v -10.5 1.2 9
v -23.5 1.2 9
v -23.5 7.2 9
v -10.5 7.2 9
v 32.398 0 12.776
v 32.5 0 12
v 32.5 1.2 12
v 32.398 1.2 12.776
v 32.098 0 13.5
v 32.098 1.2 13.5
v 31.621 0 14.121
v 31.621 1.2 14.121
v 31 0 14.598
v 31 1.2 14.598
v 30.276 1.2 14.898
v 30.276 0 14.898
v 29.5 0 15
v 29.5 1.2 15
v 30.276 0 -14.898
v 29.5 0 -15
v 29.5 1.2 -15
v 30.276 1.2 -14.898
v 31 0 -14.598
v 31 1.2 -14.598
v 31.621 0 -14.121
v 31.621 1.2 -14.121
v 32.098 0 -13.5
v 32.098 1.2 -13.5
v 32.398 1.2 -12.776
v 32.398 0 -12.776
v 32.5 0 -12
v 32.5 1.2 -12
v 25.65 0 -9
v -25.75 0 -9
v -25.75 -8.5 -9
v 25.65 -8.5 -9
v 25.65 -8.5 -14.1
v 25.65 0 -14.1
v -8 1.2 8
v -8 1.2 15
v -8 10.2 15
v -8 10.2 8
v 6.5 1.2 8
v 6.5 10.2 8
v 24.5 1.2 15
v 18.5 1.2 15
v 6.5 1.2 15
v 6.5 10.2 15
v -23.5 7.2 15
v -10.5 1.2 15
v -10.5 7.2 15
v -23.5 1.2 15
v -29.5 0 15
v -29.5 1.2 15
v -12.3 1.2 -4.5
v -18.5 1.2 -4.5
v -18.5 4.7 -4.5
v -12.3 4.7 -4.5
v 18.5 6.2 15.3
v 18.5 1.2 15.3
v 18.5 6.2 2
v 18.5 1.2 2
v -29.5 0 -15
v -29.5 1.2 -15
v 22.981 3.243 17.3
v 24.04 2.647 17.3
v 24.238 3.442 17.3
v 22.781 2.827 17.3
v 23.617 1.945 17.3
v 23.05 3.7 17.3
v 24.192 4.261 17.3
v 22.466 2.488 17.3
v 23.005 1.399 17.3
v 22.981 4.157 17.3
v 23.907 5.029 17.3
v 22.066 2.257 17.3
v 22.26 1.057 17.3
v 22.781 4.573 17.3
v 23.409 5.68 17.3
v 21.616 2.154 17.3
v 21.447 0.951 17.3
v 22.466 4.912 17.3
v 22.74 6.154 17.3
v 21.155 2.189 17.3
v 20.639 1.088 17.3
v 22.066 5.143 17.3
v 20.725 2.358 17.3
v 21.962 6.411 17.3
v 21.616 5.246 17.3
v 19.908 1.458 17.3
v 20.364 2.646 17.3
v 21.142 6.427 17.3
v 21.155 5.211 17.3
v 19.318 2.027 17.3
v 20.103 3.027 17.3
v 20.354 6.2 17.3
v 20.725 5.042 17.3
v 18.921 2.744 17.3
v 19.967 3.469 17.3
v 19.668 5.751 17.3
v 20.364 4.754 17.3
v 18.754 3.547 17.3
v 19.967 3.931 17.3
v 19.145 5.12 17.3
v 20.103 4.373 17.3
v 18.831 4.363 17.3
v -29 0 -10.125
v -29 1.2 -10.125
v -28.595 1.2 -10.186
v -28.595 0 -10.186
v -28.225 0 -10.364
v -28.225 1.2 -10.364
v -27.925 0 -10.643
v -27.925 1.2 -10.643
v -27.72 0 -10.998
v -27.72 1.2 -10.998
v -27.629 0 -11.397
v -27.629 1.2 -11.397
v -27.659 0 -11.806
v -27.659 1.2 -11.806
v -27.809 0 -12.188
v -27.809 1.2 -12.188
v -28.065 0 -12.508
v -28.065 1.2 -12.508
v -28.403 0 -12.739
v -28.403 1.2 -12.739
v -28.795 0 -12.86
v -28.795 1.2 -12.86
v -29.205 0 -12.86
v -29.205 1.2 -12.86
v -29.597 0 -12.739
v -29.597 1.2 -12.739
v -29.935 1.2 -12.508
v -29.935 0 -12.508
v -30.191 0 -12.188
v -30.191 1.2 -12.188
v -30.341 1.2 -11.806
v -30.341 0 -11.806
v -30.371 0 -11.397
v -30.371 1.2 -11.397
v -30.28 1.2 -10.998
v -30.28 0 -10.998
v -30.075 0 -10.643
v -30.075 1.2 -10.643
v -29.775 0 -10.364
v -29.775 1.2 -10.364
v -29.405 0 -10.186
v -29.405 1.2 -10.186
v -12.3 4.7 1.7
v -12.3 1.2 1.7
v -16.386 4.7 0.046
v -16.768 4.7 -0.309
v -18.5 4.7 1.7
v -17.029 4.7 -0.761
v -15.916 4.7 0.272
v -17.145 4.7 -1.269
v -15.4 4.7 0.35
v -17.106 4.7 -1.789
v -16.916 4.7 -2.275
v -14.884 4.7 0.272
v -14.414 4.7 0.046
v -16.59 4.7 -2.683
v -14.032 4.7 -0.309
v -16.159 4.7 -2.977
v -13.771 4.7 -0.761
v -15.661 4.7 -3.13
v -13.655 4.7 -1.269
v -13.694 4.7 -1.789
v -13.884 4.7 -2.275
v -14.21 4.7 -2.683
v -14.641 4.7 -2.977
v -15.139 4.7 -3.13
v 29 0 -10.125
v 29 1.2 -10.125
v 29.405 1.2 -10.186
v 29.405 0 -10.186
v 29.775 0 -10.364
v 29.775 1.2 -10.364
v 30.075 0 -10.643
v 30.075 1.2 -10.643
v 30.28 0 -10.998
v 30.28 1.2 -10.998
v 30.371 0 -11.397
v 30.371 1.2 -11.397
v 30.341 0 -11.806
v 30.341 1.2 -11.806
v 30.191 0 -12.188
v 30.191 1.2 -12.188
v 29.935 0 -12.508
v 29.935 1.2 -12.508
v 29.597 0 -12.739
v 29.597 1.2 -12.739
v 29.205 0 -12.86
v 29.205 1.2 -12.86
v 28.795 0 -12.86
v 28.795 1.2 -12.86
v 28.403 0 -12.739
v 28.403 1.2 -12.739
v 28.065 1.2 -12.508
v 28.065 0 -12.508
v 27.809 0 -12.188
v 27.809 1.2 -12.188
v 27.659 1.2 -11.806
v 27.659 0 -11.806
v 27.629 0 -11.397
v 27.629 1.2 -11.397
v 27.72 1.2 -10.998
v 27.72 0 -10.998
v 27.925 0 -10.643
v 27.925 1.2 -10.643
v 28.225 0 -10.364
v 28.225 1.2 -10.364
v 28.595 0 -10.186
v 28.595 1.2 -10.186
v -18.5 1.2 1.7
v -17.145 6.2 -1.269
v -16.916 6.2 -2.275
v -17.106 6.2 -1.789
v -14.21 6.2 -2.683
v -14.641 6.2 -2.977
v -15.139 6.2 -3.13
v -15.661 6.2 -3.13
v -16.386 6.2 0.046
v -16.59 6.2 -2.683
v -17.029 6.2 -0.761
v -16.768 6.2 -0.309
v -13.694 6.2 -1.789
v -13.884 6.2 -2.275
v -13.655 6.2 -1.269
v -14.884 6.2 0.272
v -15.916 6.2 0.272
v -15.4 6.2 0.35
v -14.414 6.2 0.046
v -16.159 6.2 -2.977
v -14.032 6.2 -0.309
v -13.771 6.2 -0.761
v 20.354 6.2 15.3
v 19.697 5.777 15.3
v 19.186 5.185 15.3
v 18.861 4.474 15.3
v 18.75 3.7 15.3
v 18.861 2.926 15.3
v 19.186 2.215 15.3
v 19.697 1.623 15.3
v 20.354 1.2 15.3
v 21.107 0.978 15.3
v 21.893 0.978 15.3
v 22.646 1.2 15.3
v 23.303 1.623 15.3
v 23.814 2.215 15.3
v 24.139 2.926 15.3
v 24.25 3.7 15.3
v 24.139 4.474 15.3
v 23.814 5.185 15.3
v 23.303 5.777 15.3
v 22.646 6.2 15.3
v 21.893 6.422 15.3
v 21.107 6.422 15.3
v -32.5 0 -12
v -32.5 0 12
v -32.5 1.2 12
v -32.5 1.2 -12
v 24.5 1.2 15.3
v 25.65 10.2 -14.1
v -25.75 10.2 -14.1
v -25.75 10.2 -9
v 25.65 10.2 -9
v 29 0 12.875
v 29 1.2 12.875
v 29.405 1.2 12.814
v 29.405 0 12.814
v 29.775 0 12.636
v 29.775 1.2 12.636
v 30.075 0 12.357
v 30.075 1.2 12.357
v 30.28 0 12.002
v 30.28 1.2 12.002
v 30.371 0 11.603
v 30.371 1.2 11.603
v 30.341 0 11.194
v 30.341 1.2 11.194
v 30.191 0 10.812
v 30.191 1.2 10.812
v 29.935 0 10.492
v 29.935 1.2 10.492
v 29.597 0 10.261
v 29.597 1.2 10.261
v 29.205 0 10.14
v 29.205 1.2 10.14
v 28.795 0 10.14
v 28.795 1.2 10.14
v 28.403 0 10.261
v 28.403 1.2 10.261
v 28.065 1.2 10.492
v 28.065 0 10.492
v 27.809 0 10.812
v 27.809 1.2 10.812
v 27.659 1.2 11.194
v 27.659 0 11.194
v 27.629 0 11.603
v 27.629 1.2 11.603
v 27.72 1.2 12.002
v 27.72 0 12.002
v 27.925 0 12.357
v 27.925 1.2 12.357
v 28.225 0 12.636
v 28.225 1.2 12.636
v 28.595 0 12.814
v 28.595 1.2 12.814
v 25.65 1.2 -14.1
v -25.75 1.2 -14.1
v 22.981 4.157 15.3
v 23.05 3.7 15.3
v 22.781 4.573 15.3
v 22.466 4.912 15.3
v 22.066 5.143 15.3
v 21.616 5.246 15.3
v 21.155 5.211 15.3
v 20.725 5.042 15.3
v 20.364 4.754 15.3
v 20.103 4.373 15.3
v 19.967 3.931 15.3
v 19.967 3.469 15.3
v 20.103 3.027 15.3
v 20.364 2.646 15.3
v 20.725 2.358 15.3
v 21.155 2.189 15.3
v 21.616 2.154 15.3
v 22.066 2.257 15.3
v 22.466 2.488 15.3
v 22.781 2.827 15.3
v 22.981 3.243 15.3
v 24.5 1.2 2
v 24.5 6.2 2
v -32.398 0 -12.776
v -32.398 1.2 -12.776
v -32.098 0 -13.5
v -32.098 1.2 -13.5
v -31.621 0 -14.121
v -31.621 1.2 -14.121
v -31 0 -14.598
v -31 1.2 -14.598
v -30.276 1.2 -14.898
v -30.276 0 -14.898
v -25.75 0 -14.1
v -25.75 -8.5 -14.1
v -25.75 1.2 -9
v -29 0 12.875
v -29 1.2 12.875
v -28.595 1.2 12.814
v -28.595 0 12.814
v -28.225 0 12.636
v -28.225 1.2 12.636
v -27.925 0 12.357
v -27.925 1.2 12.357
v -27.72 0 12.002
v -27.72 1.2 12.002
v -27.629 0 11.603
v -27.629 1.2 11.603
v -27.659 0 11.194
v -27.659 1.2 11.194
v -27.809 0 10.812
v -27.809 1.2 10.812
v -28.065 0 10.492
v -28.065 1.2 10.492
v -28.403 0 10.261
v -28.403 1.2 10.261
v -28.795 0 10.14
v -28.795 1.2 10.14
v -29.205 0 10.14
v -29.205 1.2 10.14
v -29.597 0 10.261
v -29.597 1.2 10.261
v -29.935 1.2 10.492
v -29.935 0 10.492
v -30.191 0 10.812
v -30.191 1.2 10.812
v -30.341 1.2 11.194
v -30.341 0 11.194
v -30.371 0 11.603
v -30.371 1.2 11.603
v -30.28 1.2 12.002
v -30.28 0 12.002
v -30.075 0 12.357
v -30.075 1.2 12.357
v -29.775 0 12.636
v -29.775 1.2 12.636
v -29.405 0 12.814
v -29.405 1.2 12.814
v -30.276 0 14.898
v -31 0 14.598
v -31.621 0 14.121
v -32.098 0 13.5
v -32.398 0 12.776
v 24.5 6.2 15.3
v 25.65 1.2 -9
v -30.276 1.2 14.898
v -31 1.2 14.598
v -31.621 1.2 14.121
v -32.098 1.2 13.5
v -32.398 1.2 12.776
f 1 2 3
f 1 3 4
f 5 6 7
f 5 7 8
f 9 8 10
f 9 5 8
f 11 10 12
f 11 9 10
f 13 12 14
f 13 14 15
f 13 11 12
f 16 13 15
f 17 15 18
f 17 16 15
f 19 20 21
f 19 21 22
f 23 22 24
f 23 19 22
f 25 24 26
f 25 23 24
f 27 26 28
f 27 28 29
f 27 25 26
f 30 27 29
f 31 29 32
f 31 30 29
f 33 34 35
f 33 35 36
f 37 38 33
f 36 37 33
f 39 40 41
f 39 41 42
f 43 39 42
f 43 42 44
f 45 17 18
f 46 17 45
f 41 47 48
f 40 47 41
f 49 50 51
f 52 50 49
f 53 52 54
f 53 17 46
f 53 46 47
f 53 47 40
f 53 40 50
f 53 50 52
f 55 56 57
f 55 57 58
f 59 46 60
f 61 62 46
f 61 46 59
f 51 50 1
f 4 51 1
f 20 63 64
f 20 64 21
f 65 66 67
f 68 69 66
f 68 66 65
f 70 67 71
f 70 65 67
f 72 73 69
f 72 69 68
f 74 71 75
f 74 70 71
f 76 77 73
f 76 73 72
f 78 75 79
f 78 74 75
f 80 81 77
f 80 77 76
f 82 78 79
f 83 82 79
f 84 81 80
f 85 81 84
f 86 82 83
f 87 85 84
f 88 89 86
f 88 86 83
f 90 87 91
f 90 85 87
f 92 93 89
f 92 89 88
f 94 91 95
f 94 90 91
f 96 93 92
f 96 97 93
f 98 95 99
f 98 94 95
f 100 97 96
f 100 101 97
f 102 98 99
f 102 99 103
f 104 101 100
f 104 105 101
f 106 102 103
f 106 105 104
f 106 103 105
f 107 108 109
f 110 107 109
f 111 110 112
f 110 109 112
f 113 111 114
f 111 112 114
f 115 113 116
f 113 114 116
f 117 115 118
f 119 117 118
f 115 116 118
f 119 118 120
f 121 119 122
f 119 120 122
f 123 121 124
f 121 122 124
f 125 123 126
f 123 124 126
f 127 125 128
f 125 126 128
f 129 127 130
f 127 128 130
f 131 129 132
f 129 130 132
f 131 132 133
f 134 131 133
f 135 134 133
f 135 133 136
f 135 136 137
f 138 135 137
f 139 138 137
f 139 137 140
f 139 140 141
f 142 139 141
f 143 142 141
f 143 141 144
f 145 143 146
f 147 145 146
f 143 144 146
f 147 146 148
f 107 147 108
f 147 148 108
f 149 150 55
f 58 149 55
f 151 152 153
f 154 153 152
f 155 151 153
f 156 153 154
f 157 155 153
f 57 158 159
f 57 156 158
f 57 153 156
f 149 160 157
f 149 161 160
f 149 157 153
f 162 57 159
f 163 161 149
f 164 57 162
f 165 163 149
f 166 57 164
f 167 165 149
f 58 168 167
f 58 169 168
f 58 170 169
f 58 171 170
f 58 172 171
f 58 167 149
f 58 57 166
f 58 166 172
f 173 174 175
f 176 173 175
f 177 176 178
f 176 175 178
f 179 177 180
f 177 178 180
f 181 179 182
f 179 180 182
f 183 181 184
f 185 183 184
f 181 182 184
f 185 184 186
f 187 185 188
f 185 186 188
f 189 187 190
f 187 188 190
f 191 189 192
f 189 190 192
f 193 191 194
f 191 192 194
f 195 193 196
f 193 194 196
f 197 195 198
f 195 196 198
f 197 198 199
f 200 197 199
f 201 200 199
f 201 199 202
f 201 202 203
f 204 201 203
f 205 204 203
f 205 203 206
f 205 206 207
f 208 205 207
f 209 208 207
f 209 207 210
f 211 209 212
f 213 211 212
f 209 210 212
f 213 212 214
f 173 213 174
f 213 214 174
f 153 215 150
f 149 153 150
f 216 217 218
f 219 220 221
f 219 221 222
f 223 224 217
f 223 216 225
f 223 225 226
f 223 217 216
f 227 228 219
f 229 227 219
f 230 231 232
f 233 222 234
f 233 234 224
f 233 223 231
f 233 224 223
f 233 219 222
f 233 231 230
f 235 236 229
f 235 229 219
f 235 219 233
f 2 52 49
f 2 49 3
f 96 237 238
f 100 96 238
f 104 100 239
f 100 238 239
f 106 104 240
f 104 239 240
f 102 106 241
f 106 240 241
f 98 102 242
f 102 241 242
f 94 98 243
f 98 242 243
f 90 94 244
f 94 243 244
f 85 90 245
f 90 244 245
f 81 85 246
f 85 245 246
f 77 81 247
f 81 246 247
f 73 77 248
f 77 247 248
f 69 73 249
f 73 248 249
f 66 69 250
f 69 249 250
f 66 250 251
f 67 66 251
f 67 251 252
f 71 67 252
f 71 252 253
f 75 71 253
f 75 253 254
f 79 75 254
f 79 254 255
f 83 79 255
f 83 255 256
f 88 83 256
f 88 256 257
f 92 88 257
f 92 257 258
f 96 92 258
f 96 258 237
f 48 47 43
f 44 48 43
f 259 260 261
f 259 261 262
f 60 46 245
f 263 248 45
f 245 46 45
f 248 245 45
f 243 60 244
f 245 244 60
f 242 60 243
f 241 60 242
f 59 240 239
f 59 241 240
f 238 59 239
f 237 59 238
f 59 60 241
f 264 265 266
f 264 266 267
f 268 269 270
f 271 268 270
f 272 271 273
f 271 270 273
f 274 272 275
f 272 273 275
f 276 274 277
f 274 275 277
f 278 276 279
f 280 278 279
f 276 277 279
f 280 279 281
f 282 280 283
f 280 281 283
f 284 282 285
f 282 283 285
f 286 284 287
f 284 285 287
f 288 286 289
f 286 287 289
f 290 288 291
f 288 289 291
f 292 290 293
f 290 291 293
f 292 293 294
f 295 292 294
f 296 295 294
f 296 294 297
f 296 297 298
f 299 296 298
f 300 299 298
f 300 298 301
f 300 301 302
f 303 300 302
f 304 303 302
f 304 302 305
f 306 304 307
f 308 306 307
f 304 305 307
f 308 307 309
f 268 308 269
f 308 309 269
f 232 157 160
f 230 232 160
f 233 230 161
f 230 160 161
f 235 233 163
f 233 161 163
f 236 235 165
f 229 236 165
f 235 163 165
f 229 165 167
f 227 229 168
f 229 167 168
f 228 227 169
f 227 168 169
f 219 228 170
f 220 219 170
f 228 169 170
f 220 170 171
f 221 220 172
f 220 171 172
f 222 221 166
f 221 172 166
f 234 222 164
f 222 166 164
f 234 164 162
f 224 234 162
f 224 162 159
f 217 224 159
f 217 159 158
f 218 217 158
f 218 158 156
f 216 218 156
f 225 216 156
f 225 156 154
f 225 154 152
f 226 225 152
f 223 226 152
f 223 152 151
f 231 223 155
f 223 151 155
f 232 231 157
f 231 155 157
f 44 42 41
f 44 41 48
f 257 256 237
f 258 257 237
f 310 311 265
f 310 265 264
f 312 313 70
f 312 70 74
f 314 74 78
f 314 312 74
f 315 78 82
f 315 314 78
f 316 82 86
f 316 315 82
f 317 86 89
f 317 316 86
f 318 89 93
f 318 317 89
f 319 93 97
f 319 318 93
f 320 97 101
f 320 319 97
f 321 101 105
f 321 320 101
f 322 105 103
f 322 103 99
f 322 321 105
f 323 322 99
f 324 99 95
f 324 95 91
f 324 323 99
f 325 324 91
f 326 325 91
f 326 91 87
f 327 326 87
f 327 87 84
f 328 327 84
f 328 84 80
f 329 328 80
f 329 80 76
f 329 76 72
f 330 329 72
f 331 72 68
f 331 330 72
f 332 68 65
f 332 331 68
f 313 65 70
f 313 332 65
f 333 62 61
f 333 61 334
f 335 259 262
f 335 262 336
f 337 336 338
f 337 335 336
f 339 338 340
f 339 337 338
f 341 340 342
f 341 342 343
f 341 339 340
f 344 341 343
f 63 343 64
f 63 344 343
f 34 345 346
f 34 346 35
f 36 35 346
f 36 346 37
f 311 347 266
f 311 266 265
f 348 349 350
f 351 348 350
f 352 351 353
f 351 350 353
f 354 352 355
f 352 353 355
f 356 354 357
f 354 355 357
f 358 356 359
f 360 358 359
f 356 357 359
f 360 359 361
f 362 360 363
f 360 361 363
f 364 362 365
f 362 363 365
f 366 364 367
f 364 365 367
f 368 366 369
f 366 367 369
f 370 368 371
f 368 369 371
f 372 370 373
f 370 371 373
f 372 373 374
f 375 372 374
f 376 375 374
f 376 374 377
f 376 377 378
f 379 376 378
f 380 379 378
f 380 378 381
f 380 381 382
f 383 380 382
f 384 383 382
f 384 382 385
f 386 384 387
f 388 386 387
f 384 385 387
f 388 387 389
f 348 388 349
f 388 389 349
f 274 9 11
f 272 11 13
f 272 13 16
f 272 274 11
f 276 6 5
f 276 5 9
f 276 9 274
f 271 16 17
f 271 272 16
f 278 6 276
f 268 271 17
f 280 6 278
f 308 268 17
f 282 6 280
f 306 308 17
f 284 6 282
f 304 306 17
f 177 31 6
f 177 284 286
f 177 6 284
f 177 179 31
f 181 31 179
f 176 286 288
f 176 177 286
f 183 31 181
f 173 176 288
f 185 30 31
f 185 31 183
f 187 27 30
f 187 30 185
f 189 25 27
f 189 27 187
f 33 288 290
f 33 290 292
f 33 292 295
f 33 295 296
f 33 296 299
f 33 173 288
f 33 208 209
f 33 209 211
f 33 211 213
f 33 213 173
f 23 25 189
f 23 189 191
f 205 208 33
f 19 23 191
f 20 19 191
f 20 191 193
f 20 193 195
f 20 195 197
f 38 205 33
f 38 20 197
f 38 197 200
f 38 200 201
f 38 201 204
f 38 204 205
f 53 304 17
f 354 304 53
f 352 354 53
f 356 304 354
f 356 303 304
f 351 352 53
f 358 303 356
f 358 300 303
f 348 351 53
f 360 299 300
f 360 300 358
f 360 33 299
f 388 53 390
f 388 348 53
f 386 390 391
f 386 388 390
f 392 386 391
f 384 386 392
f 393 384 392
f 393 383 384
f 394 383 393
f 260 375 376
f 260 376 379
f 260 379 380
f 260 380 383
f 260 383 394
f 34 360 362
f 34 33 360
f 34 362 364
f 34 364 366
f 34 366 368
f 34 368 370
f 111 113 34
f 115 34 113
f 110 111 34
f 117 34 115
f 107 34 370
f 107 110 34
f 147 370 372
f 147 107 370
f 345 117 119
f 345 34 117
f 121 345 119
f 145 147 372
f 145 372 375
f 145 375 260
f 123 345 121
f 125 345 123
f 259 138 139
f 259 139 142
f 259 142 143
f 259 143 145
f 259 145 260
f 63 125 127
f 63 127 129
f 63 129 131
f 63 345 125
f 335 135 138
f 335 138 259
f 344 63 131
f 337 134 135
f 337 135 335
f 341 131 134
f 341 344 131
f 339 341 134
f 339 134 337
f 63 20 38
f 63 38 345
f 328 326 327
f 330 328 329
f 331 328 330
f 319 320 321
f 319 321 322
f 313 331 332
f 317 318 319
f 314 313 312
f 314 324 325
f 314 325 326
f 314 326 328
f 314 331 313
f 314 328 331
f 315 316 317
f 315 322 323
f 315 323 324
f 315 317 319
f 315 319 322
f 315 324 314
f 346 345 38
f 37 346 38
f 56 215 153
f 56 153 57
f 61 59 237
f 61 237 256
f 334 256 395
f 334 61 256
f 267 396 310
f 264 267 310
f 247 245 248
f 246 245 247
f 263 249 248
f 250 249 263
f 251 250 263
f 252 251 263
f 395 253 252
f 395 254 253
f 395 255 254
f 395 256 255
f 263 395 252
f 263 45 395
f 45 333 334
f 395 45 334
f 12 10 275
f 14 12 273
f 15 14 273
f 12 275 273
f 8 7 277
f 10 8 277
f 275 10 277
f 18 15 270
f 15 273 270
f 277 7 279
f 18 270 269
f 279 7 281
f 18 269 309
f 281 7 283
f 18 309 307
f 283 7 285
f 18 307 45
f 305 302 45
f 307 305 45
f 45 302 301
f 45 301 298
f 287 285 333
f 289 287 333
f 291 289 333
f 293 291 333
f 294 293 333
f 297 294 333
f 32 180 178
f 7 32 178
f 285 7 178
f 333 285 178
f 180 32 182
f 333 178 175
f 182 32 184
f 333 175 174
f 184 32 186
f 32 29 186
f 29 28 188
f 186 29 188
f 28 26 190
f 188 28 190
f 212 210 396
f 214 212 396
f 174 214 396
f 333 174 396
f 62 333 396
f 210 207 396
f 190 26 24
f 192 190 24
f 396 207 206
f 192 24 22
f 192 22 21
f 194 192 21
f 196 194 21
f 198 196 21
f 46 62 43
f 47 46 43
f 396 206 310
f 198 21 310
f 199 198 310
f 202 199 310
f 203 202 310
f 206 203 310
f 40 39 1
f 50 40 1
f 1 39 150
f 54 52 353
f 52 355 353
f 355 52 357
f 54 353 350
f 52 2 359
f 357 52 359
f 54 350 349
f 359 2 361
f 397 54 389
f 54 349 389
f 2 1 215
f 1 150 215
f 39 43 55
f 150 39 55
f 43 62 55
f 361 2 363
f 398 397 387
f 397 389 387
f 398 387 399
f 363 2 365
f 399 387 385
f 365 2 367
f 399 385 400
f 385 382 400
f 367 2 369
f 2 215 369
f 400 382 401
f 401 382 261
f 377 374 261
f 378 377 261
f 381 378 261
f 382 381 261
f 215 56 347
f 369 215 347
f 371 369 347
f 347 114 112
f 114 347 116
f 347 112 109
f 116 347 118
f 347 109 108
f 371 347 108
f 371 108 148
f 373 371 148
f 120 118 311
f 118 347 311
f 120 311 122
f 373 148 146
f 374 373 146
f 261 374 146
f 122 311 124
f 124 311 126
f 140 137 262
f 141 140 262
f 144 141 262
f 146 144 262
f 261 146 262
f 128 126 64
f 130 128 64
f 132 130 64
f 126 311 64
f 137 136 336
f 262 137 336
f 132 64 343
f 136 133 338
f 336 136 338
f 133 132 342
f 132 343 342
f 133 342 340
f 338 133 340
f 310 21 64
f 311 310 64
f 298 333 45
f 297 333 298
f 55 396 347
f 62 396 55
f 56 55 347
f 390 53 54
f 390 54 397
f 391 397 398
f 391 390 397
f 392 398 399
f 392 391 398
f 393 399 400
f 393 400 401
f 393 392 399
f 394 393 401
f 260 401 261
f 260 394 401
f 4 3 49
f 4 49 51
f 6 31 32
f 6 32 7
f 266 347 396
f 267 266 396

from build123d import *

# Parameters (mm, degrees)
EXTRUDE_1_DEPTH     = 1.2
SKETCH_2_R          = 1.375
CUT_EXTRUDE_1_DEPTH = 1.2
SKETCH_3_W          = 6
SKETCH_3_H          = 13
EXTRUDE_2_DEPTH     = 5
SKETCH_4_W          = 6
SKETCH_4_H          = 5
EXTRUDE_3_DEPTH     = 0.3
SKETCH_5_W          = 14.5
SKETCH_5_H          = 7
EXTRUDE_4_DEPTH     = 9
SKETCH_6_W          = 13
SKETCH_6_H          = 6
EXTRUDE_5_DEPTH     = 6
SKETCH_11_W         = 51.4
SKETCH_11_H         = 5.1
EXTRUDE_9_DEPTH     = 8.5
SKETCH_12_W         = 6.2
SKETCH_12_H         = 6.2
EXTRUDE_10_DEPTH    = 3.5
SKETCH_13_R         = 1.75
EXTRUDE_11_DEPTH    = 1.5
SKETCH_15_R         = 2.75
SKETCH_15_R_2       = 1.55
EXTRUDE_13_DEPTH    = 2
SKETCH_16_W         = 51.4
SKETCH_16_H         = 5.1
EXTRUDE_14_DEPTH    = 9


with BuildPart() as part:
    # 草图1 → 凸台-拉伸1 (new body)
    with BuildSketch(Plane(origin=(0, 0, 0), x_dir=(1, 0, 0), z_dir=(0, 1, 0))):
        with BuildLine():
            Line((-29.5, 15), (29.5, 15))
            ThreePointArc((29.5, 15), (31.621320344, 14.121320344), (32.5, 12))
            Line((32.5, 12), (32.5, -12))
            ThreePointArc((32.5, -12), (31.621320344, -14.121320344), (29.5, -15))
            Line((29.5, -15), (-29.5, -15))
            ThreePointArc((-29.5, -15), (-31.621320344, -14.121320344), (-32.5, -12))
            Line((-32.5, -12), (-32.5, 12))
            ThreePointArc((-32.5, 12), (-31.621320344, 14.121320344), (-29.5, 15))
        make_face()
    extrude(amount=EXTRUDE_1_DEPTH)

    # 草图2 → 切除-拉伸1 (cut)
    with BuildSketch(Plane(origin=(0, 1.2, 0), x_dir=(1, 0, 0), z_dir=(0, 1, 0))):
        with Locations(Location((29, -11.5, 0), (0, 0, 270))):
            Circle(SKETCH_2_R)
        with Locations(Location((29, 11.5, 0), (0, 0, 270))):
            Circle(SKETCH_2_R)
        with Locations(Location((-29, -11.5, 0), (0, 0, 270))):
            Circle(SKETCH_2_R)
        with Locations(Location((-29, 11.5, 0), (0, 0, 270))):
            Circle(SKETCH_2_R)
    extrude(amount=-CUT_EXTRUDE_1_DEPTH, mode=Mode.SUBTRACT)

    # 草图3 → 凸台-拉伸2 (add)
    with BuildSketch(Plane(origin=(0, 1.2, 0), x_dir=(1, 0, 0), z_dir=(0, 1, 0))):
        with Locations((21.5, -8.5)):
            Rectangle(SKETCH_3_W, SKETCH_3_H)
    extrude(amount=EXTRUDE_2_DEPTH)

    # 草图4 → 凸台-拉伸3 (add)
    with BuildSketch(Plane.XY.offset(15)):
        with Locations((21.5, 3.7)):
            Rectangle(SKETCH_4_W, SKETCH_4_H)
    extrude(amount=EXTRUDE_3_DEPTH)

    # 草图5 → 凸台-拉伸4 (add)
    with BuildSketch(Plane(origin=(0, 1.2, 0), x_dir=(1, 0, 0), z_dir=(0, 1, 0))):
        with Locations((-0.75, -11.5)):
            Rectangle(SKETCH_5_W, SKETCH_5_H)
    extrude(amount=EXTRUDE_4_DEPTH)

    # 草图6 → 凸台-拉伸5 (add)
    with BuildSketch(Plane(origin=(0, 1.2, 0), x_dir=(1, 0, 0), z_dir=(0, 1, 0))):
        with Locations((-17, -12)):
            Rectangle(SKETCH_6_W, SKETCH_6_H)
    extrude(amount=EXTRUDE_5_DEPTH)

    # 草图11 → 凸台-拉伸9 (add)
    with BuildSketch(Plane.XZ):
        with Locations((-0.05, -11.55)):
            Rectangle(SKETCH_11_W, SKETCH_11_H)
    extrude(amount=EXTRUDE_9_DEPTH)

    # 草图12 → 凸台-拉伸10 (add)
    with BuildSketch(Plane(origin=(0, 1.2, 0), x_dir=(1, 0, 0), z_dir=(0, 1, 0))):
        with Locations((-15.4, 1.4)):
            Rectangle(SKETCH_12_W, SKETCH_12_H)
    extrude(amount=EXTRUDE_10_DEPTH)

    # 草图13 → 凸台-拉伸11 (add)
    with BuildSketch(Plane(origin=(0, 4.7, 0), x_dir=(1, 0, 0), z_dir=(0, 1, 0))):
        with Locations(Location((-15.4, 1.4, 0), (0, 0, 270))):
            Circle(SKETCH_13_R)
    extrude(amount=EXTRUDE_11_DEPTH)

    # 草图15 → 凸台-拉伸13 (add)
    with BuildSketch(Plane.XY.offset(15.3)):
        with Locations(Location((21.5, 3.7, 0), (0, 0, 114.619977329))):
            Circle(SKETCH_15_R)
        with Locations((21.5, 3.7)):
            Circle(SKETCH_15_R_2, mode=Mode.SUBTRACT)
    extrude(amount=EXTRUDE_13_DEPTH)

    # 草图16 → 凸台-拉伸14 (add)
    with BuildSketch(Plane(origin=(0, 1.2, 0), x_dir=(1, 0, 0), z_dir=(0, 1, 0))):
        with Locations((-0.05, 11.55)):
            Rectangle(SKETCH_16_W, SKETCH_16_H)
    extrude(amount=EXTRUDE_14_DEPTH)


solid = part.part
